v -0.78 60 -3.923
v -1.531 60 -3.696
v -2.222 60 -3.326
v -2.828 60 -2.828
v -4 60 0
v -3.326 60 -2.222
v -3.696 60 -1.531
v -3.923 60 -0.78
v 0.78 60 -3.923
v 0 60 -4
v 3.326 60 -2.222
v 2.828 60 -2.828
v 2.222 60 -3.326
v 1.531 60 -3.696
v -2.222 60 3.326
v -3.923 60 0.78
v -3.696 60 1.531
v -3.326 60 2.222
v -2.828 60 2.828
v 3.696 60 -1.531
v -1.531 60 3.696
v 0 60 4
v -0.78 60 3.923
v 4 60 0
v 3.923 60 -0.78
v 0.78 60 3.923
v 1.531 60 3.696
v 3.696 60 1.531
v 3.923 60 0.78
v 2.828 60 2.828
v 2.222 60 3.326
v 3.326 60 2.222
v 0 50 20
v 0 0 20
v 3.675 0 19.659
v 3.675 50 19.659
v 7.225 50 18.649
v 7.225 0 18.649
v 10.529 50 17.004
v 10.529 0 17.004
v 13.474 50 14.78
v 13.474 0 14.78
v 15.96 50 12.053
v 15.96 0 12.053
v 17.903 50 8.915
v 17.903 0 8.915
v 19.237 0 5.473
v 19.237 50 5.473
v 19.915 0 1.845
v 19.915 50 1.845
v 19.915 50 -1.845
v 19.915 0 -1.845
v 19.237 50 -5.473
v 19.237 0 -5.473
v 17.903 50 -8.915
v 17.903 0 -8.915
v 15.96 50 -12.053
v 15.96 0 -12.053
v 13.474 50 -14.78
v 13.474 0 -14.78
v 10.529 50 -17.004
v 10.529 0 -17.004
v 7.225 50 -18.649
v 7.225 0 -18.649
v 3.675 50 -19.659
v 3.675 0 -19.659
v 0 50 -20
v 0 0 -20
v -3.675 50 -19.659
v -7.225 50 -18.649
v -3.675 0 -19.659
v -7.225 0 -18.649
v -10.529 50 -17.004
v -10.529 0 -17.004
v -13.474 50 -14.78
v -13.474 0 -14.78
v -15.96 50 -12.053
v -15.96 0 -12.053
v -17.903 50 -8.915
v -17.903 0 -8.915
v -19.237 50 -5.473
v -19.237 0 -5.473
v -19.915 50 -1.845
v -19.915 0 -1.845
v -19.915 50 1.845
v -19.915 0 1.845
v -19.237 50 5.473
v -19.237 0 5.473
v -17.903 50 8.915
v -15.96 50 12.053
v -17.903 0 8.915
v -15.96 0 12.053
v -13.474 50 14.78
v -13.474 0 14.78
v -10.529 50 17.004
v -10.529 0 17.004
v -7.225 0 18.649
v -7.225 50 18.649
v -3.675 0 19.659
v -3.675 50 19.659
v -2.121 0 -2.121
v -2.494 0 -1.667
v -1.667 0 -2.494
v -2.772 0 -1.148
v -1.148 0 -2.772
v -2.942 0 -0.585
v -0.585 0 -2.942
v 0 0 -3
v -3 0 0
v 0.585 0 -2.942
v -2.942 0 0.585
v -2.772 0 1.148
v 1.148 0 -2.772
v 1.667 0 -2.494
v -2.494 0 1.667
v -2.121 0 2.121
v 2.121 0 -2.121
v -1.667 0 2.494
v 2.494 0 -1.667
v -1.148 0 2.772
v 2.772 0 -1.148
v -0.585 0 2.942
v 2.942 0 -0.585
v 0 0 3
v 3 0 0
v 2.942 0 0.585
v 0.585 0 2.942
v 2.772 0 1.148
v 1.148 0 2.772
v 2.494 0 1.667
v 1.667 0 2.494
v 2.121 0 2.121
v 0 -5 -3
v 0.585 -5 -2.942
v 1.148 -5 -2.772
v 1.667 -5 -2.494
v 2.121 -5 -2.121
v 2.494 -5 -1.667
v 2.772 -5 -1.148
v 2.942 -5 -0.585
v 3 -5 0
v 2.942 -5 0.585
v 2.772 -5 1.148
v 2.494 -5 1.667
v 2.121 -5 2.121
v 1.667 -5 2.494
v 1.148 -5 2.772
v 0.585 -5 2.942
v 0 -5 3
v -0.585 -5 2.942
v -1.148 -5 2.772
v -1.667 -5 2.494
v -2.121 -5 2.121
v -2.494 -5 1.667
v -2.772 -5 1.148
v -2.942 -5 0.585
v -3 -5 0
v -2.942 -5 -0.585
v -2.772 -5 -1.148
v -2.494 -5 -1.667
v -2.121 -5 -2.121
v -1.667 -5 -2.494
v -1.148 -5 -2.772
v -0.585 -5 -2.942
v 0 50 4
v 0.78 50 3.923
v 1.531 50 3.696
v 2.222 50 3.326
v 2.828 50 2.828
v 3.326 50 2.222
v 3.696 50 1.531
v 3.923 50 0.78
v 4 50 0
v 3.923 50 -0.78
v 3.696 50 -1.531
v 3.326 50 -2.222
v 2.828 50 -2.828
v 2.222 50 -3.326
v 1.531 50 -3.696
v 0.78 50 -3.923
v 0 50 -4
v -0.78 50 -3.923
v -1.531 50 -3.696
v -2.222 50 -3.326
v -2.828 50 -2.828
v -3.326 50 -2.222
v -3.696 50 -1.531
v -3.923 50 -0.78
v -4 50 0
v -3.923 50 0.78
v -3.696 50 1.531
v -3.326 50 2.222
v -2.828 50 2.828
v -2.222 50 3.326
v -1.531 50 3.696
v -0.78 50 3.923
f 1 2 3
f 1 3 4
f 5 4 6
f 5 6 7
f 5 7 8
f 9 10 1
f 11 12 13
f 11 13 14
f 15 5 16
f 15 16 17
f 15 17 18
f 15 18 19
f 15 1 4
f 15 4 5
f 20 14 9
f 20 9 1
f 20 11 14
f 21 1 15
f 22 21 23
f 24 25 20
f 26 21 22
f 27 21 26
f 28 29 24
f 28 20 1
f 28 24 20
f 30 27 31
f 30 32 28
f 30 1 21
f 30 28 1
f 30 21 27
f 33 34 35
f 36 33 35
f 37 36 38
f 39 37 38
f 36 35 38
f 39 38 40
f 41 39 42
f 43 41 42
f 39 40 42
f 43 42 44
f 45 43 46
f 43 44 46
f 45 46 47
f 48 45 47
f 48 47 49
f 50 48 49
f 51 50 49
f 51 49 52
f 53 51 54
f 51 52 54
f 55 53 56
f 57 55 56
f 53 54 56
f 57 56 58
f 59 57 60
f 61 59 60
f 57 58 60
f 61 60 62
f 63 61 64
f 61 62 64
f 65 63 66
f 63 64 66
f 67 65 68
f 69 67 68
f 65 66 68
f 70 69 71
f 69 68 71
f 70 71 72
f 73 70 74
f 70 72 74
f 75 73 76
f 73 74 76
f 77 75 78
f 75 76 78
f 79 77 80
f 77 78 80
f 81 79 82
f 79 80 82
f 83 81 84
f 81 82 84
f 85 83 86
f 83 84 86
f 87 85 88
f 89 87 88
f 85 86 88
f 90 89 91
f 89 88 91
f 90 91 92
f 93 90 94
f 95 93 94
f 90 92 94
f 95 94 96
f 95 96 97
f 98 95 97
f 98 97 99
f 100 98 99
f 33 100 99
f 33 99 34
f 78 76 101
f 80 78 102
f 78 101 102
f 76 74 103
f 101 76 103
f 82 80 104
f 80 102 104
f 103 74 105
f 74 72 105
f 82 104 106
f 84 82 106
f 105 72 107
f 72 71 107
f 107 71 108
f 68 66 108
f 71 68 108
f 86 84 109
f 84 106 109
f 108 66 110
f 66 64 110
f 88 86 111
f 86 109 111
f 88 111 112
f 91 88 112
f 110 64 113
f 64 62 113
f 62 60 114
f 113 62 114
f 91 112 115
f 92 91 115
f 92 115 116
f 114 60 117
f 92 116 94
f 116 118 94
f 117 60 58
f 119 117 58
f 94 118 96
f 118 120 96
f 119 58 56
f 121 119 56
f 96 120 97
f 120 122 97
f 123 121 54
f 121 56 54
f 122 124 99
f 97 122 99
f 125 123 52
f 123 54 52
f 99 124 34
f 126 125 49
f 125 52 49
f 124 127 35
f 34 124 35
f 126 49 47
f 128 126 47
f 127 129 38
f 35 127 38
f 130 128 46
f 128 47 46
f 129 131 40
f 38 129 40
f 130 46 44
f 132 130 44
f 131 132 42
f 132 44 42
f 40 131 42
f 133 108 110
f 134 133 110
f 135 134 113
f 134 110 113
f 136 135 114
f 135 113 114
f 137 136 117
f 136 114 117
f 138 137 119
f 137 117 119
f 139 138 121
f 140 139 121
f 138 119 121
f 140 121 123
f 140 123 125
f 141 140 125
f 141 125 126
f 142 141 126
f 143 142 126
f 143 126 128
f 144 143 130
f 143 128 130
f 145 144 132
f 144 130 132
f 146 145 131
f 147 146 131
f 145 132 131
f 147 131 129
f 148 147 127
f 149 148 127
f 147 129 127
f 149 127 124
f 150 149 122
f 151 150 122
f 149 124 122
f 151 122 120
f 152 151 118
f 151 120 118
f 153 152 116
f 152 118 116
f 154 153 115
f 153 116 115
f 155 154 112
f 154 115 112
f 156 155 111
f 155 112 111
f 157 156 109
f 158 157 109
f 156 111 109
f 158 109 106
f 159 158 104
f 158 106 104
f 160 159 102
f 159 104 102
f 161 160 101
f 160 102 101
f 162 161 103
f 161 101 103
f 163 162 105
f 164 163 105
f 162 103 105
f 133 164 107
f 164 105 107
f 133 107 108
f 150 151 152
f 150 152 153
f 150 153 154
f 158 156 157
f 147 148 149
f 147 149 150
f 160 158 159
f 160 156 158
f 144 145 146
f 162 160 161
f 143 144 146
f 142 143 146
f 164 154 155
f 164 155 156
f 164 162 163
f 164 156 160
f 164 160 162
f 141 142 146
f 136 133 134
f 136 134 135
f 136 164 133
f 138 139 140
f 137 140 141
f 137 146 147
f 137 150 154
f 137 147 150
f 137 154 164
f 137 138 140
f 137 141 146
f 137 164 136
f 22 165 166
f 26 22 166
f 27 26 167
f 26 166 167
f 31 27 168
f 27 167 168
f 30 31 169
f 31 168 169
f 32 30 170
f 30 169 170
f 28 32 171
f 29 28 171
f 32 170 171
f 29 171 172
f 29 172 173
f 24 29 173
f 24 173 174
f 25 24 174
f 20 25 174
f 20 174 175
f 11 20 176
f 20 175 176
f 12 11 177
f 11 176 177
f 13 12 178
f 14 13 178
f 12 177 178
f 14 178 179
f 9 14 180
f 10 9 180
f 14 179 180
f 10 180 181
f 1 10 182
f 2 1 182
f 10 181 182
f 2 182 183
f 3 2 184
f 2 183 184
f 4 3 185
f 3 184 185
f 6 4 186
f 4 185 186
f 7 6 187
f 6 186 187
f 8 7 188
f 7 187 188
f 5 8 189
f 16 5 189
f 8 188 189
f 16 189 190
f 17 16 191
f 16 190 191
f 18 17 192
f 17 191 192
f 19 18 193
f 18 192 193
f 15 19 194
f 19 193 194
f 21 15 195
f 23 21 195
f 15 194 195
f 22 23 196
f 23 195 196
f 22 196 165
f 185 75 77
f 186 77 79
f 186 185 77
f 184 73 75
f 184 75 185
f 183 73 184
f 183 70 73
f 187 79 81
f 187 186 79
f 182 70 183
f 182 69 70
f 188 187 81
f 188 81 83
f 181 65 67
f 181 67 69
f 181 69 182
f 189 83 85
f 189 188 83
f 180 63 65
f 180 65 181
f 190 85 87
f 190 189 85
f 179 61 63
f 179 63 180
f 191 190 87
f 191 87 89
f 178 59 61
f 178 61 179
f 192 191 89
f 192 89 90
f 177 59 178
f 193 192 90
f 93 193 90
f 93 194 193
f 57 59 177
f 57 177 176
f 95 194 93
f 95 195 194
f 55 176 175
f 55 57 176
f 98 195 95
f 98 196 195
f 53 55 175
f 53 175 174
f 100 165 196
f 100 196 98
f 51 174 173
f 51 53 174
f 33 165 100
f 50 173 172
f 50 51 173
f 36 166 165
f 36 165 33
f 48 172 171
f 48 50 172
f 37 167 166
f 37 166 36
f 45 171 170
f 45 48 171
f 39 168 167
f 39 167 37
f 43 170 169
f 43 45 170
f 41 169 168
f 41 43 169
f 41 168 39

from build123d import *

# Parameters (mm, degrees)
SKETCH_3_R      = 20
EXTRUDE_3_DEPTH = 50
SKETCH_4_R      = 3
EXTRUDE_4_DEPTH = 5
SKETCH_5_R      = 4
EXTRUDE_5_DEPTH = 10


with BuildPart() as part:
    # 草图3 → 凸台-拉伸3 (new body)
    with BuildSketch(Plane(origin=(0, 0, 0), x_dir=(1, 0, 0), z_dir=(0, 1, 0))):
        with Locations(Location((0, 0, 0), (0, 0, 270))):
            Circle(SKETCH_3_R)
    extrude(amount=EXTRUDE_3_DEPTH)

    # 草图4 → 凸台-拉伸4 (add)
    with BuildSketch(Plane.XZ):
        with Locations(Location((0, 0, 0), (0, 0, 270))):
            Circle(SKETCH_4_R)
    extrude(amount=EXTRUDE_4_DEPTH)

    # 草图5 → 凸台-拉伸5 (add)
    with BuildSketch(Plane(origin=(0, 50, 0), x_dir=(1, 0, 0), z_dir=(0, 1, 0))):
        with Locations(Location((0, 0, 0), (0, 0, 270))):
            Circle(SKETCH_5_R)
    extrude(amount=EXTRUDE_5_DEPTH)


solid = part.part
